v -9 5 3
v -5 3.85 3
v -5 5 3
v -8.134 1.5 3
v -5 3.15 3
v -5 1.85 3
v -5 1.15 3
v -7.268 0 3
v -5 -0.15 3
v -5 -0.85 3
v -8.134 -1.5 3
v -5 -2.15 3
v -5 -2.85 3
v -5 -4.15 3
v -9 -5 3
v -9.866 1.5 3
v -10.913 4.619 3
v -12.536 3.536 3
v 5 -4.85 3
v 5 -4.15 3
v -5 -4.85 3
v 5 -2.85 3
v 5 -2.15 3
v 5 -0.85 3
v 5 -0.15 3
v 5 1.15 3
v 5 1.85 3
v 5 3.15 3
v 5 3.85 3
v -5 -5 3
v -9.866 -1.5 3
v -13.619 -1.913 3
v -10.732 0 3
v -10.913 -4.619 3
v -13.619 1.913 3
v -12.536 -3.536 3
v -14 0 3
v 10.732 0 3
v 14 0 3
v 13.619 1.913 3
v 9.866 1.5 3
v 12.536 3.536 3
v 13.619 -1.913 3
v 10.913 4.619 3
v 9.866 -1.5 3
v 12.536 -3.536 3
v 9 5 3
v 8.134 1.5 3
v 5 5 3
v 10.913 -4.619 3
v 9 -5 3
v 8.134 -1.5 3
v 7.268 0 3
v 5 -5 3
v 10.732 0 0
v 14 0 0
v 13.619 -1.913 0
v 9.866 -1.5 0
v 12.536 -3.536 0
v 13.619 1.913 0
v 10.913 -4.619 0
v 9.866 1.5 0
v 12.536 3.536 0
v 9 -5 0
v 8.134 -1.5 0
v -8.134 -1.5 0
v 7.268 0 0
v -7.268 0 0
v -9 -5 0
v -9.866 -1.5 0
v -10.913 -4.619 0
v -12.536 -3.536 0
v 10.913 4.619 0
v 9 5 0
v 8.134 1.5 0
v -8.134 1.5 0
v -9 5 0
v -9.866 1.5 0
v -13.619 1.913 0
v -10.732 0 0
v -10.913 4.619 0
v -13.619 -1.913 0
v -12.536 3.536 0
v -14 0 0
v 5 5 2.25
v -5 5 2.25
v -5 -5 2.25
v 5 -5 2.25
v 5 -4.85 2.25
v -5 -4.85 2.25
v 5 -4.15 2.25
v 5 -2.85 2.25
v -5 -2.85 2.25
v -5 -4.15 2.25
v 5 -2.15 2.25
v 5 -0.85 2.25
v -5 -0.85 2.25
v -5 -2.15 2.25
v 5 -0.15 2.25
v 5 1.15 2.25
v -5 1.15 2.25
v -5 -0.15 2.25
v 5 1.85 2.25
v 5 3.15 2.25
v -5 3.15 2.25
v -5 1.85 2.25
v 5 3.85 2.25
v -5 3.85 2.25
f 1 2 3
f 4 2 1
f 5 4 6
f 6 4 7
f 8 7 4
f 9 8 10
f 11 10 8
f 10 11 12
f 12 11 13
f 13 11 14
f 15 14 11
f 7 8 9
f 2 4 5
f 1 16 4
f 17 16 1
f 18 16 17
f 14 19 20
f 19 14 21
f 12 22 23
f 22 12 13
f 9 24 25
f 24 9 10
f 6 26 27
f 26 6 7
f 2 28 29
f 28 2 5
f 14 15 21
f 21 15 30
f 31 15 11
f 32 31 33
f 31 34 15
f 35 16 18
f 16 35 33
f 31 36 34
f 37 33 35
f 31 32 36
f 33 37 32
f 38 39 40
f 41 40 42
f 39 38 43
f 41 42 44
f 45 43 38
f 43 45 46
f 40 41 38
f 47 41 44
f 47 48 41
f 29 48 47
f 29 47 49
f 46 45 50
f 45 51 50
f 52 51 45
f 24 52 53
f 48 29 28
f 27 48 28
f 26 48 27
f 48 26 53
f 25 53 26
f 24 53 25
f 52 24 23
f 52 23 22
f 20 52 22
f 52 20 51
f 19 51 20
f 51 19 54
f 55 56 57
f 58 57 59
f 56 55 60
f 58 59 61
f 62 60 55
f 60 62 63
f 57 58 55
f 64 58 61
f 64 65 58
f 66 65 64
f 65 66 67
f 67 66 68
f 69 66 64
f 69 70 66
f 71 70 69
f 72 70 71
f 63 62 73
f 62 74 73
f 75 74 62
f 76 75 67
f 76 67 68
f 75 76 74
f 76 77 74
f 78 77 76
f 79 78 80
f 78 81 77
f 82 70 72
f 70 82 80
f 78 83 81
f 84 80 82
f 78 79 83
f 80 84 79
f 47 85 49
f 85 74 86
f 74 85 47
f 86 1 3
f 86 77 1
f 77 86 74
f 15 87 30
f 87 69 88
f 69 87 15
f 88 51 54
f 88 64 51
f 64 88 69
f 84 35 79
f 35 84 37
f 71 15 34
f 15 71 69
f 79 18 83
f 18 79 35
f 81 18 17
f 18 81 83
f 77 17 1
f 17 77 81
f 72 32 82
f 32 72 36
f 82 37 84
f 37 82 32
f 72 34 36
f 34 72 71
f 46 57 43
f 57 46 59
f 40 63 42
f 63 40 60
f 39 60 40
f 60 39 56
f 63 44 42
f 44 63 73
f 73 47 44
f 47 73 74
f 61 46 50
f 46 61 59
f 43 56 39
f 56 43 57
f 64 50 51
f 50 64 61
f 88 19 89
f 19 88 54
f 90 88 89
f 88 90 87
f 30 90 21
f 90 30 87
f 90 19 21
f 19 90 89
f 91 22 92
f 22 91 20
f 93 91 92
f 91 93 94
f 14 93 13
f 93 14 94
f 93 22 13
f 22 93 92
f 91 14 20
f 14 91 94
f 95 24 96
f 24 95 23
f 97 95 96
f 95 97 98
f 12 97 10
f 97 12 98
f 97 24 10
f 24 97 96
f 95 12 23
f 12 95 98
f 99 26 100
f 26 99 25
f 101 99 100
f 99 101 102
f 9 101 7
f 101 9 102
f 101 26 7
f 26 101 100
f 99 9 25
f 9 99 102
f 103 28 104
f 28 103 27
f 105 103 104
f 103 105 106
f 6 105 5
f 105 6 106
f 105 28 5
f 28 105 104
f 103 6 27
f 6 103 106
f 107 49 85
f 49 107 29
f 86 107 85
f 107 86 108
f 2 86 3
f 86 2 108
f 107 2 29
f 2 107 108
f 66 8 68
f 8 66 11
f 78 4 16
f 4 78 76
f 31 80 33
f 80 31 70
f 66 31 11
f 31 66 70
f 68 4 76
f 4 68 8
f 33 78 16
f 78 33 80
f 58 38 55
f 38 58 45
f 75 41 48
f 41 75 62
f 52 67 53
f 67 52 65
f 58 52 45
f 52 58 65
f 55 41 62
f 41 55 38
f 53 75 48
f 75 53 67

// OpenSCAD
// file: functions.scad
// PRUSA Mendel  
// Functions used in many files
// GNU GPL v3
// Josef Průša
// josefprusa@me.com
// prusadjs.cz
// http://www.reprap.org/wiki/Prusa_Mendel
// http://github.com/prusajr/PrusaMendel


module nut(d,h,horizontal=true) {
	cornerdiameter = (d / 2) / cos (180 / 6);
	cylinder(h = h, r = cornerdiameter, $fn = 6);
	if(horizontal) {
		for(i = [1:6]) {
			rotate([0,0,60*i]) translate([-cornerdiameter-0.2,0,0]) rotate([0,0,-45]) cube(size = [2,2,h]);
		}
	}
}

// Based on nophead research
module polyhole(d,h) {
	n = max(round(2 * d),3);
	rotate([0,0,180])
		cylinder(h = h, r = (d / 2) / cos (180 / n), $fn = n);
}

module roundcorner(diameter) {
	difference() {
		cube(size = [diameter,diameter,99], center = false);
		translate(v = [diameter, diameter, 0]) cylinder(h = 100, r=diameter, center=true);
	}
}
// file: metric.scad
// PRUSA Mendel  
// Default metric sizes
// GNU GPL v2
// Josef Průša
// josefprusa@me.com
// prusadjs.cz
// http://www.reprap.org/wiki/Prusa_Mendel
// http://github.com/prusajr/PrusaMendel

// DONT CHANGE THIS FILE! ALTER VALUES IN CONFIGURATION.SCAD INSTEAD

// RODS

threaded_rod_diameter = 8.2;
threaded_rod_diameter_horizontal = 8.2;
smooth_bar_diameter = 8;
smooth_bar_diameter_horizontal = 8.5;

// Nuts and bolts
// Nut diameters are flat to flat

m8_diameter = 9;
m8_nut_diameter = 16.4;
m8_nut_thickness = 6.5;

m4_diameter = 4.5;
m4_nut_diameter = 9;
m4_nut_thickness = 3.2;

m3_diameter = 3.6;
m3_nut_diameter = 6.1;
m3_nut_thickness = 2.4;

// Bushing holder

bushing_core_diameter = smooth_bar_diameter;
bushing_material_thickness = 1;

// Motors

motor_shaft = 5.5;
// file: configuration.scad
// PRUSA Mendel  
// Configuration file
// GNU GPL v3
// Josef Průša
// josefprusa@me.com
// prusadjs.cz
// http://www.reprap.org/wiki/Prusa_Mendel
// http://github.com/prusajr/PrusaMendel

// PLEASE SELECT ONE OF THE CONFIGURATIONS BELOW
// BY UN-COMMENTING IT

// Uncomment for metric settings
// METRIC METRIC METRIC METRIC METRIC METRIC METRIC METRIC 

include <metric.scad>;

// CUSTOM CUSTOM CUSTOM CUSTOM CUSTOM CUSTOM CUSTOM CUSTOM CUSTOM

thin_wall = 3;


// Linear bearing version
linear = true;
// set false for LM-8UU, true for LM-E-8UU (ignore if linear is set to false)
lme8uu = false;



// CHANGE ONLY THE STUFF YOU KNOW
// IT WILL REPLACE DEFAULT SETTING

// RODS

// threaded_rod_diameter = 0;
// threaded_rod_diameter_horizontal = 0;
// smooth_bar_diameter = 0;
// smooth_bar_diameter_horizontal = 0;

// Nuts and bolts

// m8_diameter = 0;
// m8_nut_diameter = 0;

// m4_diameter = 0;
// m4_nut_diameter = 0;

m3_diameter = 3; // polyholes need the exact measurement
// m3_nut_diameter = 0;

// Bushing holder

// bushing_core_diameter = smooth_bar_diameter;
// bushing_material_thickness = 0;


///counted stuff
m3_nut_diameter_bigger = ((m3_nut_diameter  / 2) / cos (180 / 6))*2;

// functions 
include <functions.scad>
// main file
// PRUSA Mendel  
// Belt clamp
// GNU GPL v3
// Josef Průša
// josefprusa@me.com
// prusadjs.cz
// http://www.reprap.org/wiki/Prusa_Mendel
// http://github.com/prusajr/PrusaMendel
//
// modified by neurofun

include <configuration.scad>

module beltclamp() {

	clamp_height = 3;
	clamp_width = 10;
	clamp_length = 18;		// distance between the center of the 2 holes
	belt_pitch = 2;
	belt_width = 10;
	tooth_width = 1.3;
	tooth_heigth = .75;
	offset = belt_pitch/4;
	// uncomment next line for a symetric clamp
	//offset = 0;

	difference() {
		// basic shape
		union(0) {
			translate(v = [0,0,clamp_height/2]) cube([clamp_length,clamp_width,clamp_height], center=true);
			translate(v = [-clamp_length/2, 0, 0]) cylinder(r=clamp_width/2,h=clamp_height);
			translate(v = [clamp_length/2, 0, 0]) cylinder(r=clamp_width/2,h=clamp_height);
		}
		// screw holes
		translate(v = [-clamp_length/2, 0, -1]) polyhole(m3_diameter, clamp_height+2);
		translate(v = [clamp_length/2, 0, -1]) polyhole(m3_diameter, clamp_height+2);
		
		// belt grip
		translate(v = [0,offset,clamp_height-tooth_heigth])
			for ( i = [round(-clamp_width/belt_pitch/2) : round(clamp_width/belt_pitch/2)]) {
				translate(v = [0,belt_pitch*i,tooth_heigth])cube(size = [belt_width, tooth_width, tooth_heigth*2], center = true);
			}
	}
}

beltclamp();
